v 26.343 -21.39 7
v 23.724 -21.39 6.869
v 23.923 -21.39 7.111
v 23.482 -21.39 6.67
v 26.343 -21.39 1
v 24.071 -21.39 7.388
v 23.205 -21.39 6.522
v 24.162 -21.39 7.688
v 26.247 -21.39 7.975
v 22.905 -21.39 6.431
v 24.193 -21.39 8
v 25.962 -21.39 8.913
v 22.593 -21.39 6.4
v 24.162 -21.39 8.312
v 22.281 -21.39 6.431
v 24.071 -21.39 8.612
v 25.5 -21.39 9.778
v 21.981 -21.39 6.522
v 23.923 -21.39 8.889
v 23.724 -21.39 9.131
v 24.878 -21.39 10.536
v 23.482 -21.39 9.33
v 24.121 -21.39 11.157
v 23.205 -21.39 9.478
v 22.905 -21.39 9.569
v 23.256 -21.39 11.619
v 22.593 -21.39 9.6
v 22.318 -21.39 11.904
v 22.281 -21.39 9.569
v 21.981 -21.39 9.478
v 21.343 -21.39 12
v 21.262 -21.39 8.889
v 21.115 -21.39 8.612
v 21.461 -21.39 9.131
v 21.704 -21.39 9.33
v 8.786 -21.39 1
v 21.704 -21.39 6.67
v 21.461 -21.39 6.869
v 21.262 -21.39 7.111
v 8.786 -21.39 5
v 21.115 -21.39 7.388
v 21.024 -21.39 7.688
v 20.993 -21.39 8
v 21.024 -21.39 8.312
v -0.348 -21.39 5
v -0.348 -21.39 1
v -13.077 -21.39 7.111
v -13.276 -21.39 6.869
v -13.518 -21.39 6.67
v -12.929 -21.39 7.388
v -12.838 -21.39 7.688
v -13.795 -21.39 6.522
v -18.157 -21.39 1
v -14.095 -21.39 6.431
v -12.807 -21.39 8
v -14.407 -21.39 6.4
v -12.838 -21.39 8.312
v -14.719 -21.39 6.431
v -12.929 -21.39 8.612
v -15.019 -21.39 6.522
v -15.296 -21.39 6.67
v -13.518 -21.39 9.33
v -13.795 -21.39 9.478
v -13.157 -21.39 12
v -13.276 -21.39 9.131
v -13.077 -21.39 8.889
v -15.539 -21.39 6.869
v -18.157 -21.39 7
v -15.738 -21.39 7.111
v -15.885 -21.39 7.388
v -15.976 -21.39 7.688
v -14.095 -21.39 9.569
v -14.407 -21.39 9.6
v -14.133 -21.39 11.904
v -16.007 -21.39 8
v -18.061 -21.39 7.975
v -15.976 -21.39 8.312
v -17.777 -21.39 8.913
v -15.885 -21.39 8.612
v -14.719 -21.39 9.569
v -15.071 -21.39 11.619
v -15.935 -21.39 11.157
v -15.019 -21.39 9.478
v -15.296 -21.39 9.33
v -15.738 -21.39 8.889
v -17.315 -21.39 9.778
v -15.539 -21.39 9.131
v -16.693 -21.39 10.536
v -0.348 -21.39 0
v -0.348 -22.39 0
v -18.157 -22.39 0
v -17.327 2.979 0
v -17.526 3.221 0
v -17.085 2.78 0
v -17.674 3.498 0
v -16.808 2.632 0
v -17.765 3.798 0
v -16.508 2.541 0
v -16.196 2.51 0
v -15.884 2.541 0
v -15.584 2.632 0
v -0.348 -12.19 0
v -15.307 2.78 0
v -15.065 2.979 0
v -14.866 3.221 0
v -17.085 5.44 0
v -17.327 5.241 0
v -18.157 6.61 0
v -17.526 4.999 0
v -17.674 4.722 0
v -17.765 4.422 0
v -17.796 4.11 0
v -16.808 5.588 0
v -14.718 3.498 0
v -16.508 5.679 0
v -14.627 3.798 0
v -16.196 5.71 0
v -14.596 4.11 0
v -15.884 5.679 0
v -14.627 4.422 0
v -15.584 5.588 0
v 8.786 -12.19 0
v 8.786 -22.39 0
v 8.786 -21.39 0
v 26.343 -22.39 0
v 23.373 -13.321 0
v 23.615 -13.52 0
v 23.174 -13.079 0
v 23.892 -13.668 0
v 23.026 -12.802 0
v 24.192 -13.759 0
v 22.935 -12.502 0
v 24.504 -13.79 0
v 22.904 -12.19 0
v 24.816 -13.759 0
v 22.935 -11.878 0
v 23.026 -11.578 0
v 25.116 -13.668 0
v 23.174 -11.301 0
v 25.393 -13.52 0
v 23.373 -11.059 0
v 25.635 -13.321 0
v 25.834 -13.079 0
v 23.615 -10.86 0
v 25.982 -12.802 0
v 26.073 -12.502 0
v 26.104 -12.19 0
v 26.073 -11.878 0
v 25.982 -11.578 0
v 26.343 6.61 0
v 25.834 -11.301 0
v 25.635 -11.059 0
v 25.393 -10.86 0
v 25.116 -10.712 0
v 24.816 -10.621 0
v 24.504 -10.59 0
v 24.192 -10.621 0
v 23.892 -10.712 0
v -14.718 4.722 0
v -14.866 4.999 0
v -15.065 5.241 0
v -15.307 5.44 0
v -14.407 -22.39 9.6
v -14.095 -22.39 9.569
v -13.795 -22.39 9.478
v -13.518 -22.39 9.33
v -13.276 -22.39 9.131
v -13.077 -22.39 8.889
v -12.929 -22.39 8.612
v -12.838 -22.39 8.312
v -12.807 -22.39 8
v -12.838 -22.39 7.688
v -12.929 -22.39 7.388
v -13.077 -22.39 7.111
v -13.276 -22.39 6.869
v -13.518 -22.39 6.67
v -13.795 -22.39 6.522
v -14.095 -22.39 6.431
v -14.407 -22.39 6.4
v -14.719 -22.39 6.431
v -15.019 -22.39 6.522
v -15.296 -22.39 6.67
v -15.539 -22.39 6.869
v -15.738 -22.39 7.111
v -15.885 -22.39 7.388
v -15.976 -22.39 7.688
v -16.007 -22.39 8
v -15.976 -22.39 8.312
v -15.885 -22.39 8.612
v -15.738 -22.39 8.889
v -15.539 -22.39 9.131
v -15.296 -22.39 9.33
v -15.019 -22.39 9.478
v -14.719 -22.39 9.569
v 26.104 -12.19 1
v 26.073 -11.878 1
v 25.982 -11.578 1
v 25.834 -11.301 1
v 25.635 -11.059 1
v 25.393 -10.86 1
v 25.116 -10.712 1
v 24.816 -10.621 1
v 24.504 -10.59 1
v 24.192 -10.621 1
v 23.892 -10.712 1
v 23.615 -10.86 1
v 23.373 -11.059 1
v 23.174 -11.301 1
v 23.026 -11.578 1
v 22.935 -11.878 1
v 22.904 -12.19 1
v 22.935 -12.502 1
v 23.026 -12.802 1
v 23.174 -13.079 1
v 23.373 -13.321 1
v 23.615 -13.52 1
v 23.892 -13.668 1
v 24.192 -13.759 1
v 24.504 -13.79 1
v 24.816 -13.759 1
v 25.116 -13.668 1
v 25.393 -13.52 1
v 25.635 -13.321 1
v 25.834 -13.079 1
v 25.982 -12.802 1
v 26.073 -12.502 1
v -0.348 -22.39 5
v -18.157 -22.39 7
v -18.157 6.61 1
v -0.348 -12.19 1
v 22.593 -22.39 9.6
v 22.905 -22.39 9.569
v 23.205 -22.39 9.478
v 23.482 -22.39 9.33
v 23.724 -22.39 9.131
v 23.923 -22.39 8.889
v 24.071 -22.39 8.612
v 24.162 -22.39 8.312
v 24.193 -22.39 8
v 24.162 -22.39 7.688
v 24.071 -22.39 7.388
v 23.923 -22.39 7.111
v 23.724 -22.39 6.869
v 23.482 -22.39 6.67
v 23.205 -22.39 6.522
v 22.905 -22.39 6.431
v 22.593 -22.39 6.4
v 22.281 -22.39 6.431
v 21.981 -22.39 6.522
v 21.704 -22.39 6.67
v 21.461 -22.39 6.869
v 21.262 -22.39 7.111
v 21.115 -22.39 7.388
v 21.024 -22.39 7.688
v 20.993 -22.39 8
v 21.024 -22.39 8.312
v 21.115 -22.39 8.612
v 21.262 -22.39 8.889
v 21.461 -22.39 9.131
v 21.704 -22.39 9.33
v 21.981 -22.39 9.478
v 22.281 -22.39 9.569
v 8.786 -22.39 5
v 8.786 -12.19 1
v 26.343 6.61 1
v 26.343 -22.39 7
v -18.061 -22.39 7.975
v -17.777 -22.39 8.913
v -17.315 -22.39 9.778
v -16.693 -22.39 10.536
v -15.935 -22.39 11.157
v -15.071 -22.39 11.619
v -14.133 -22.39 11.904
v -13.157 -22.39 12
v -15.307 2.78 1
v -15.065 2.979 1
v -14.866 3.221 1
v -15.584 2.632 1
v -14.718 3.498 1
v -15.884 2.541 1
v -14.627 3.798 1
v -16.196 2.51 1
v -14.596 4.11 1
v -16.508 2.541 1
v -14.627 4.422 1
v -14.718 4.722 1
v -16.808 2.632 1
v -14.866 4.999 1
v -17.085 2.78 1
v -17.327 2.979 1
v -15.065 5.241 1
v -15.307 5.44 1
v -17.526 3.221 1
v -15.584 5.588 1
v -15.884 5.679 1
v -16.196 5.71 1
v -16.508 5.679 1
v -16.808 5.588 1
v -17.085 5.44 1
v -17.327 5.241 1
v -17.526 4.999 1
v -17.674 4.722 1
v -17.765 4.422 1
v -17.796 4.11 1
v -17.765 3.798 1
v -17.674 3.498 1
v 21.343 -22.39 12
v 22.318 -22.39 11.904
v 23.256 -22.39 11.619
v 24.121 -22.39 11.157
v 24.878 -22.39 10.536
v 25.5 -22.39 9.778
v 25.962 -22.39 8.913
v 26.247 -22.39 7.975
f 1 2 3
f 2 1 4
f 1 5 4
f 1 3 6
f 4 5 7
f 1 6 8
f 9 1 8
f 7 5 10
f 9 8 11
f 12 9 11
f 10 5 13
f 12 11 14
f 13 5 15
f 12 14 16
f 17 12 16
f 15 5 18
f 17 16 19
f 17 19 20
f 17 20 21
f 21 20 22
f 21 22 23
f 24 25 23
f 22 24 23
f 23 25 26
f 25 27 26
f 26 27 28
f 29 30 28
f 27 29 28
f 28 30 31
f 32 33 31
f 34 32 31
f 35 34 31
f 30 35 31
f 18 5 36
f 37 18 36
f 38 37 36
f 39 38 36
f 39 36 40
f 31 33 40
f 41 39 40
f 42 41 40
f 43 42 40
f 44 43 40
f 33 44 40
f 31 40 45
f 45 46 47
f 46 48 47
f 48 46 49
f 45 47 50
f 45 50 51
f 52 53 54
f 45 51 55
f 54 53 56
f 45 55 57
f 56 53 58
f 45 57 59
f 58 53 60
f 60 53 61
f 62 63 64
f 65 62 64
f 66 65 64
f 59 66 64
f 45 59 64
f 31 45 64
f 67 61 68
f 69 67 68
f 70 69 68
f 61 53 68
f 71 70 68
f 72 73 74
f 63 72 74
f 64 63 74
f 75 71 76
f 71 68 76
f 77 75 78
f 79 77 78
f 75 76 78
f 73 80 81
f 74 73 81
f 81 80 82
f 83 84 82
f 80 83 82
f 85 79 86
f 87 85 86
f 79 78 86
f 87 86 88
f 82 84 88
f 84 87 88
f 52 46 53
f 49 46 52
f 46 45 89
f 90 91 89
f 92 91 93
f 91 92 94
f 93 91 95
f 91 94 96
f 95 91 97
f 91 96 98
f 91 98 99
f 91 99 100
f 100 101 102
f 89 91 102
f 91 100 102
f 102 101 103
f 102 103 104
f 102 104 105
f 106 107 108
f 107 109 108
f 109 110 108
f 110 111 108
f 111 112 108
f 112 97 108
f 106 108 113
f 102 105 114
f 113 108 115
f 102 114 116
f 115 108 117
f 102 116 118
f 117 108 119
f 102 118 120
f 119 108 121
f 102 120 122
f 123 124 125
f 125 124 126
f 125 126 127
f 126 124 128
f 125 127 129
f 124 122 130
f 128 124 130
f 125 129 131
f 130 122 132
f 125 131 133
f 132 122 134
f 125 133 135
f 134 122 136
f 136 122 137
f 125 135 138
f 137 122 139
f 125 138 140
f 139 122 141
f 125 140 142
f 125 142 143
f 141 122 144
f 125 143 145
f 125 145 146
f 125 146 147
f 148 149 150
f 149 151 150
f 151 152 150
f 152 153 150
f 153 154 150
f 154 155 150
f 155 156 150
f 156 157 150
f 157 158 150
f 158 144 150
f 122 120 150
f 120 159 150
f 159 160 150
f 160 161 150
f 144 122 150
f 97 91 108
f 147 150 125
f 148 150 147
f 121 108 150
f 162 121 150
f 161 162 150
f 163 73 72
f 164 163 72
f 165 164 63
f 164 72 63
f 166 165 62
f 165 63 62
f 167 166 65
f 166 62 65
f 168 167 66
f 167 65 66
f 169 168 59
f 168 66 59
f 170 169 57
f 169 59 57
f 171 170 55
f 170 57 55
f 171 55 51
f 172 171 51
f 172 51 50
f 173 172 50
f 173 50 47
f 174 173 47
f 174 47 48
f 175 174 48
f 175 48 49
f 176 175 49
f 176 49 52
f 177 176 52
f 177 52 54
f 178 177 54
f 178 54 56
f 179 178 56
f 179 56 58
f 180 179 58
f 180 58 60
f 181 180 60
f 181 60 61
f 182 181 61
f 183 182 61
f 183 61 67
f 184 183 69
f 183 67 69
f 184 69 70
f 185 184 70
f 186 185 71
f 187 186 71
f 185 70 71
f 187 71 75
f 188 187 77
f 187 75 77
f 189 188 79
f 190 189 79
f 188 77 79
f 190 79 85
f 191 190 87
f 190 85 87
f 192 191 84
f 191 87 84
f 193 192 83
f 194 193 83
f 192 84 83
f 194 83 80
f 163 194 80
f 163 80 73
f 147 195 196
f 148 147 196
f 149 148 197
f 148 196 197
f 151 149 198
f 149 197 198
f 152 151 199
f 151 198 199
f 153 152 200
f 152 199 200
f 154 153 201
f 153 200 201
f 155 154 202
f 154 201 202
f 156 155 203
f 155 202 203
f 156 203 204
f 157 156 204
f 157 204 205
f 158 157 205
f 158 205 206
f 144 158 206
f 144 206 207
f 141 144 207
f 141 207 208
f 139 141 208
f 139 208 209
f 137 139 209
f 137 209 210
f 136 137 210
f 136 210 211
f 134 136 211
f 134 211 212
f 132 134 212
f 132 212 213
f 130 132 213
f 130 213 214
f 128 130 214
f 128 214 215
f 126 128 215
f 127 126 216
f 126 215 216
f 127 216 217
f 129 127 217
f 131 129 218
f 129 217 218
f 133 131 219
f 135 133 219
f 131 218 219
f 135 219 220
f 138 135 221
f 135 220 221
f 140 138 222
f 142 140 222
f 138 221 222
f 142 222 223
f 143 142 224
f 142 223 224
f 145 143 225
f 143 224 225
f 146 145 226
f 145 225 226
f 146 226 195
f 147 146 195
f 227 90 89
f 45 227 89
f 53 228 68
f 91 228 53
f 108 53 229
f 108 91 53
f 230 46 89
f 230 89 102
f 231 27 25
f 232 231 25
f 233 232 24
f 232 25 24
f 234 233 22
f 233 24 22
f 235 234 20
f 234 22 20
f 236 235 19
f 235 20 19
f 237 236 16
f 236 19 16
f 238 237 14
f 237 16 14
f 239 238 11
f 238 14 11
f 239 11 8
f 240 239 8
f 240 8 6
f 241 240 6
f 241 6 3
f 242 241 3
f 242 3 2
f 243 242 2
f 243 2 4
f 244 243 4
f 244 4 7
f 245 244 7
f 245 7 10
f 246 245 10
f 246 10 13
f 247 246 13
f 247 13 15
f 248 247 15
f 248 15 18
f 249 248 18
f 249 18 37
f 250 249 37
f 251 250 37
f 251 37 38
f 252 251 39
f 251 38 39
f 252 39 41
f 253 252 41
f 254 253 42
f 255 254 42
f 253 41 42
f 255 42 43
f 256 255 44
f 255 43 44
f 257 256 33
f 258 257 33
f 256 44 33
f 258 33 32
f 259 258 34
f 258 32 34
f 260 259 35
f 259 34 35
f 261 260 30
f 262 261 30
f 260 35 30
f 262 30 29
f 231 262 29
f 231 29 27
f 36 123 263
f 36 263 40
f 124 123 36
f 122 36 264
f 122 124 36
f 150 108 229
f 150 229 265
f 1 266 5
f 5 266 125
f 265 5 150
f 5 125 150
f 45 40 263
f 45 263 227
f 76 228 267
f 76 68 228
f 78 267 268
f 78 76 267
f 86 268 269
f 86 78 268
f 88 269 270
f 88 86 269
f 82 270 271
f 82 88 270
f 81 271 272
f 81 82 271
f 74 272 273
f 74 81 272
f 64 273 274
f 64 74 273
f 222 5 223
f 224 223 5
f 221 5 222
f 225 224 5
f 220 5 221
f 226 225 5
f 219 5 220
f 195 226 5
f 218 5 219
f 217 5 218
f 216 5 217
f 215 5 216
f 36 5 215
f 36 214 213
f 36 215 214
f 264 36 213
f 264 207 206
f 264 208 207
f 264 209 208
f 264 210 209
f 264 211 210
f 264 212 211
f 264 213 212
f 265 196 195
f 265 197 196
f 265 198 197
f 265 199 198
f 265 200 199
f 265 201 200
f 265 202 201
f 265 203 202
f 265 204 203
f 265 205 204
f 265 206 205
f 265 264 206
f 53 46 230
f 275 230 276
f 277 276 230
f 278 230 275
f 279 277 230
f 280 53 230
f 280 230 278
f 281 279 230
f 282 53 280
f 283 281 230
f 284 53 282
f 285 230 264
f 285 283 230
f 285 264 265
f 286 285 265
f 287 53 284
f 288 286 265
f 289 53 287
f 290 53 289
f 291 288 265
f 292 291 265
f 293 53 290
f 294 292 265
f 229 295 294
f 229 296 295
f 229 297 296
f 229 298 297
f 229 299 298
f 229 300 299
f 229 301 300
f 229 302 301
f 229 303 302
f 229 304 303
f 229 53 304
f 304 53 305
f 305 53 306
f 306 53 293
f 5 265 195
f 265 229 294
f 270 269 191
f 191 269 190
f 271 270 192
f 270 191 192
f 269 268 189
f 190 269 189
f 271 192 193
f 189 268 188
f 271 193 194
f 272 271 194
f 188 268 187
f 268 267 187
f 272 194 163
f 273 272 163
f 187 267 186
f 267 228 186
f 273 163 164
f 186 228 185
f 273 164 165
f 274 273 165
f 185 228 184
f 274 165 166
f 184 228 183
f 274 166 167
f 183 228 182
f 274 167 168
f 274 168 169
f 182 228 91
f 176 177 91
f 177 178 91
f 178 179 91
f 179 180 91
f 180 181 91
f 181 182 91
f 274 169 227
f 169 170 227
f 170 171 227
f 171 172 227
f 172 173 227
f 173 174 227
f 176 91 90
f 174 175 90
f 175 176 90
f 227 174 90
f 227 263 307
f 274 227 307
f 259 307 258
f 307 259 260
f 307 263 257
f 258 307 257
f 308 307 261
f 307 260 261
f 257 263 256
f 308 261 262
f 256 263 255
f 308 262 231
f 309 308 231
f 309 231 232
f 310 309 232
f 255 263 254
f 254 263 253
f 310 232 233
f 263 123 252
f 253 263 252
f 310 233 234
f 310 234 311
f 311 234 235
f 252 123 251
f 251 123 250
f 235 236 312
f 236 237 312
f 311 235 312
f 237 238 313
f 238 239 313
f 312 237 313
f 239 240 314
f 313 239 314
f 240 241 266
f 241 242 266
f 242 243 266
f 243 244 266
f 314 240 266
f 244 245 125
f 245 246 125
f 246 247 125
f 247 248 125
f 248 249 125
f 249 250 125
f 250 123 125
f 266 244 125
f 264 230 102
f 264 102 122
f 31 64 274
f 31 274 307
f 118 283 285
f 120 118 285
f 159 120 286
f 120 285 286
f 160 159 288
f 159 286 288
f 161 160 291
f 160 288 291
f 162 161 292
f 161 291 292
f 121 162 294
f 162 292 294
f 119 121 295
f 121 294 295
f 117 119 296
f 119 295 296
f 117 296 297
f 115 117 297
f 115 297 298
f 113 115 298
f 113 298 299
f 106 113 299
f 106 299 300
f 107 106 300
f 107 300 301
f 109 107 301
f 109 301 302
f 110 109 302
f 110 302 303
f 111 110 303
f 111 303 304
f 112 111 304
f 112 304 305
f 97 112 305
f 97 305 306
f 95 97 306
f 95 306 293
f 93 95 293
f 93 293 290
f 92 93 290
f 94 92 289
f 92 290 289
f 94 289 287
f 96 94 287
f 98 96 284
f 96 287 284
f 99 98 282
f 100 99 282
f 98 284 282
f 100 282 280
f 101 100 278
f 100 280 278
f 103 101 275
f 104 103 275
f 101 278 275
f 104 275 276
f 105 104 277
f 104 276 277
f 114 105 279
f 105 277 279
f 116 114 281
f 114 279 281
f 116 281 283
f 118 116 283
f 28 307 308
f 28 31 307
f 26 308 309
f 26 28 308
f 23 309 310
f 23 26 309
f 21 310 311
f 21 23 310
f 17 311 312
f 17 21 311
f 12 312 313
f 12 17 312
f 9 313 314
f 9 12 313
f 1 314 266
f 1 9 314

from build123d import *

# Parameters (mm, degrees)
SKETCH1_W           = 44.5
SKETCH1_H           = 29
BOSS_EXTRUDE1_DEPTH = 12
SKETCH2_W           = 11
SKETCH2_H           = 28
CUT_EXTRUDE1_DEPTH  = 52.240207176
SKETCH3_R           = 1.6
SKETCH3_W           = 9.133902139
SKETCH3_H           = 9.2
CUT_EXTRUDE2_DEPTH  = 16.77
SKETCH4_R           = 1.6
CUT_EXTRUDE4_DEPTH  = 16.77
FILLET1_R           = 5
FILLET2_R           = 5
SKETCH11_W          = 9.133756838
SKETCH11_H          = 2
CUT_EXTRUDE7_DEPTH  = 5


with BuildPart() as part:
    # Sketch1 → Boss-Extrude1 (new body)
    with BuildSketch(Plane.XY):
        with Locations((4.092804291, -7.889927007)):
            Rectangle(SKETCH1_W, SKETCH1_H)
    extrude(amount=BOSS_EXTRUDE1_DEPTH)

    # Sketch2 → Cut-Extrude1 (cut, through all)
    with BuildSketch(Plane.ZY.offset(18.157195709)):
        with Locations((6.5, -7.389927007)):
            Rectangle(SKETCH2_W, SKETCH2_H)
    extrude(amount=-CUT_EXTRUDE1_DEPTH, mode=Mode.SUBTRACT)

    # Sketch3 → Cut-Extrude2 (cut)
    with BuildSketch(Plane.XY.offset(1)):
        with Locations((-16.195951252, 4.110072993)):
            Circle(SKETCH3_R)
        with Locations((24.504048748, -12.189927007)):
            Circle(SKETCH3_R)
        with Locations((4.21890888, -16.789927007)):
            Rectangle(SKETCH3_W, SKETCH3_H)
    extrude(amount=-CUT_EXTRUDE2_DEPTH, mode=Mode.SUBTRACT)

    # Sketch4 → Cut-Extrude4 (cut)
    with BuildSketch(Plane(origin=(0, -21.389927007, 0), x_dir=(1, 0, 0), z_dir=(0, 1, 0))):
        with Locations(Location((-14.407195709, -8, 0), (0, 0, 270))):
            Circle(SKETCH4_R)
        with Locations(Location((22.592804291, -8, 0), (0, 0, 270))):
            Circle(SKETCH4_R)
    extrude(amount=-CUT_EXTRUDE4_DEPTH, mode=Mode.SUBTRACT)

    # Fillet1
    fillet1_edges = [part.edges().sort_by_distance(p)[0] for p in [
        (-18.157195709, -21.889927007, 12),
    ]]
    fillet(fillet1_edges, radius=FILLET1_R)

    # Fillet2
    fillet2_edges = [part.edges().sort_by_distance(p)[0] for p in [
        (26.342804291, -21.889927007, 12),
    ]]
    fillet(fillet2_edges, radius=FILLET2_R)

    # Sketch11 → Cut-Extrude7 (cut)
    with BuildSketch(Plane(origin=(0, 0, 0), x_dir=(-1, 0, 0), z_dir=(0, 0, -1))):
        with Locations((-4.21898153, -22.389927007)):
            Rectangle(SKETCH11_W, SKETCH11_H)
    extrude(amount=-CUT_EXTRUDE7_DEPTH, mode=Mode.SUBTRACT)


solid = part.part
